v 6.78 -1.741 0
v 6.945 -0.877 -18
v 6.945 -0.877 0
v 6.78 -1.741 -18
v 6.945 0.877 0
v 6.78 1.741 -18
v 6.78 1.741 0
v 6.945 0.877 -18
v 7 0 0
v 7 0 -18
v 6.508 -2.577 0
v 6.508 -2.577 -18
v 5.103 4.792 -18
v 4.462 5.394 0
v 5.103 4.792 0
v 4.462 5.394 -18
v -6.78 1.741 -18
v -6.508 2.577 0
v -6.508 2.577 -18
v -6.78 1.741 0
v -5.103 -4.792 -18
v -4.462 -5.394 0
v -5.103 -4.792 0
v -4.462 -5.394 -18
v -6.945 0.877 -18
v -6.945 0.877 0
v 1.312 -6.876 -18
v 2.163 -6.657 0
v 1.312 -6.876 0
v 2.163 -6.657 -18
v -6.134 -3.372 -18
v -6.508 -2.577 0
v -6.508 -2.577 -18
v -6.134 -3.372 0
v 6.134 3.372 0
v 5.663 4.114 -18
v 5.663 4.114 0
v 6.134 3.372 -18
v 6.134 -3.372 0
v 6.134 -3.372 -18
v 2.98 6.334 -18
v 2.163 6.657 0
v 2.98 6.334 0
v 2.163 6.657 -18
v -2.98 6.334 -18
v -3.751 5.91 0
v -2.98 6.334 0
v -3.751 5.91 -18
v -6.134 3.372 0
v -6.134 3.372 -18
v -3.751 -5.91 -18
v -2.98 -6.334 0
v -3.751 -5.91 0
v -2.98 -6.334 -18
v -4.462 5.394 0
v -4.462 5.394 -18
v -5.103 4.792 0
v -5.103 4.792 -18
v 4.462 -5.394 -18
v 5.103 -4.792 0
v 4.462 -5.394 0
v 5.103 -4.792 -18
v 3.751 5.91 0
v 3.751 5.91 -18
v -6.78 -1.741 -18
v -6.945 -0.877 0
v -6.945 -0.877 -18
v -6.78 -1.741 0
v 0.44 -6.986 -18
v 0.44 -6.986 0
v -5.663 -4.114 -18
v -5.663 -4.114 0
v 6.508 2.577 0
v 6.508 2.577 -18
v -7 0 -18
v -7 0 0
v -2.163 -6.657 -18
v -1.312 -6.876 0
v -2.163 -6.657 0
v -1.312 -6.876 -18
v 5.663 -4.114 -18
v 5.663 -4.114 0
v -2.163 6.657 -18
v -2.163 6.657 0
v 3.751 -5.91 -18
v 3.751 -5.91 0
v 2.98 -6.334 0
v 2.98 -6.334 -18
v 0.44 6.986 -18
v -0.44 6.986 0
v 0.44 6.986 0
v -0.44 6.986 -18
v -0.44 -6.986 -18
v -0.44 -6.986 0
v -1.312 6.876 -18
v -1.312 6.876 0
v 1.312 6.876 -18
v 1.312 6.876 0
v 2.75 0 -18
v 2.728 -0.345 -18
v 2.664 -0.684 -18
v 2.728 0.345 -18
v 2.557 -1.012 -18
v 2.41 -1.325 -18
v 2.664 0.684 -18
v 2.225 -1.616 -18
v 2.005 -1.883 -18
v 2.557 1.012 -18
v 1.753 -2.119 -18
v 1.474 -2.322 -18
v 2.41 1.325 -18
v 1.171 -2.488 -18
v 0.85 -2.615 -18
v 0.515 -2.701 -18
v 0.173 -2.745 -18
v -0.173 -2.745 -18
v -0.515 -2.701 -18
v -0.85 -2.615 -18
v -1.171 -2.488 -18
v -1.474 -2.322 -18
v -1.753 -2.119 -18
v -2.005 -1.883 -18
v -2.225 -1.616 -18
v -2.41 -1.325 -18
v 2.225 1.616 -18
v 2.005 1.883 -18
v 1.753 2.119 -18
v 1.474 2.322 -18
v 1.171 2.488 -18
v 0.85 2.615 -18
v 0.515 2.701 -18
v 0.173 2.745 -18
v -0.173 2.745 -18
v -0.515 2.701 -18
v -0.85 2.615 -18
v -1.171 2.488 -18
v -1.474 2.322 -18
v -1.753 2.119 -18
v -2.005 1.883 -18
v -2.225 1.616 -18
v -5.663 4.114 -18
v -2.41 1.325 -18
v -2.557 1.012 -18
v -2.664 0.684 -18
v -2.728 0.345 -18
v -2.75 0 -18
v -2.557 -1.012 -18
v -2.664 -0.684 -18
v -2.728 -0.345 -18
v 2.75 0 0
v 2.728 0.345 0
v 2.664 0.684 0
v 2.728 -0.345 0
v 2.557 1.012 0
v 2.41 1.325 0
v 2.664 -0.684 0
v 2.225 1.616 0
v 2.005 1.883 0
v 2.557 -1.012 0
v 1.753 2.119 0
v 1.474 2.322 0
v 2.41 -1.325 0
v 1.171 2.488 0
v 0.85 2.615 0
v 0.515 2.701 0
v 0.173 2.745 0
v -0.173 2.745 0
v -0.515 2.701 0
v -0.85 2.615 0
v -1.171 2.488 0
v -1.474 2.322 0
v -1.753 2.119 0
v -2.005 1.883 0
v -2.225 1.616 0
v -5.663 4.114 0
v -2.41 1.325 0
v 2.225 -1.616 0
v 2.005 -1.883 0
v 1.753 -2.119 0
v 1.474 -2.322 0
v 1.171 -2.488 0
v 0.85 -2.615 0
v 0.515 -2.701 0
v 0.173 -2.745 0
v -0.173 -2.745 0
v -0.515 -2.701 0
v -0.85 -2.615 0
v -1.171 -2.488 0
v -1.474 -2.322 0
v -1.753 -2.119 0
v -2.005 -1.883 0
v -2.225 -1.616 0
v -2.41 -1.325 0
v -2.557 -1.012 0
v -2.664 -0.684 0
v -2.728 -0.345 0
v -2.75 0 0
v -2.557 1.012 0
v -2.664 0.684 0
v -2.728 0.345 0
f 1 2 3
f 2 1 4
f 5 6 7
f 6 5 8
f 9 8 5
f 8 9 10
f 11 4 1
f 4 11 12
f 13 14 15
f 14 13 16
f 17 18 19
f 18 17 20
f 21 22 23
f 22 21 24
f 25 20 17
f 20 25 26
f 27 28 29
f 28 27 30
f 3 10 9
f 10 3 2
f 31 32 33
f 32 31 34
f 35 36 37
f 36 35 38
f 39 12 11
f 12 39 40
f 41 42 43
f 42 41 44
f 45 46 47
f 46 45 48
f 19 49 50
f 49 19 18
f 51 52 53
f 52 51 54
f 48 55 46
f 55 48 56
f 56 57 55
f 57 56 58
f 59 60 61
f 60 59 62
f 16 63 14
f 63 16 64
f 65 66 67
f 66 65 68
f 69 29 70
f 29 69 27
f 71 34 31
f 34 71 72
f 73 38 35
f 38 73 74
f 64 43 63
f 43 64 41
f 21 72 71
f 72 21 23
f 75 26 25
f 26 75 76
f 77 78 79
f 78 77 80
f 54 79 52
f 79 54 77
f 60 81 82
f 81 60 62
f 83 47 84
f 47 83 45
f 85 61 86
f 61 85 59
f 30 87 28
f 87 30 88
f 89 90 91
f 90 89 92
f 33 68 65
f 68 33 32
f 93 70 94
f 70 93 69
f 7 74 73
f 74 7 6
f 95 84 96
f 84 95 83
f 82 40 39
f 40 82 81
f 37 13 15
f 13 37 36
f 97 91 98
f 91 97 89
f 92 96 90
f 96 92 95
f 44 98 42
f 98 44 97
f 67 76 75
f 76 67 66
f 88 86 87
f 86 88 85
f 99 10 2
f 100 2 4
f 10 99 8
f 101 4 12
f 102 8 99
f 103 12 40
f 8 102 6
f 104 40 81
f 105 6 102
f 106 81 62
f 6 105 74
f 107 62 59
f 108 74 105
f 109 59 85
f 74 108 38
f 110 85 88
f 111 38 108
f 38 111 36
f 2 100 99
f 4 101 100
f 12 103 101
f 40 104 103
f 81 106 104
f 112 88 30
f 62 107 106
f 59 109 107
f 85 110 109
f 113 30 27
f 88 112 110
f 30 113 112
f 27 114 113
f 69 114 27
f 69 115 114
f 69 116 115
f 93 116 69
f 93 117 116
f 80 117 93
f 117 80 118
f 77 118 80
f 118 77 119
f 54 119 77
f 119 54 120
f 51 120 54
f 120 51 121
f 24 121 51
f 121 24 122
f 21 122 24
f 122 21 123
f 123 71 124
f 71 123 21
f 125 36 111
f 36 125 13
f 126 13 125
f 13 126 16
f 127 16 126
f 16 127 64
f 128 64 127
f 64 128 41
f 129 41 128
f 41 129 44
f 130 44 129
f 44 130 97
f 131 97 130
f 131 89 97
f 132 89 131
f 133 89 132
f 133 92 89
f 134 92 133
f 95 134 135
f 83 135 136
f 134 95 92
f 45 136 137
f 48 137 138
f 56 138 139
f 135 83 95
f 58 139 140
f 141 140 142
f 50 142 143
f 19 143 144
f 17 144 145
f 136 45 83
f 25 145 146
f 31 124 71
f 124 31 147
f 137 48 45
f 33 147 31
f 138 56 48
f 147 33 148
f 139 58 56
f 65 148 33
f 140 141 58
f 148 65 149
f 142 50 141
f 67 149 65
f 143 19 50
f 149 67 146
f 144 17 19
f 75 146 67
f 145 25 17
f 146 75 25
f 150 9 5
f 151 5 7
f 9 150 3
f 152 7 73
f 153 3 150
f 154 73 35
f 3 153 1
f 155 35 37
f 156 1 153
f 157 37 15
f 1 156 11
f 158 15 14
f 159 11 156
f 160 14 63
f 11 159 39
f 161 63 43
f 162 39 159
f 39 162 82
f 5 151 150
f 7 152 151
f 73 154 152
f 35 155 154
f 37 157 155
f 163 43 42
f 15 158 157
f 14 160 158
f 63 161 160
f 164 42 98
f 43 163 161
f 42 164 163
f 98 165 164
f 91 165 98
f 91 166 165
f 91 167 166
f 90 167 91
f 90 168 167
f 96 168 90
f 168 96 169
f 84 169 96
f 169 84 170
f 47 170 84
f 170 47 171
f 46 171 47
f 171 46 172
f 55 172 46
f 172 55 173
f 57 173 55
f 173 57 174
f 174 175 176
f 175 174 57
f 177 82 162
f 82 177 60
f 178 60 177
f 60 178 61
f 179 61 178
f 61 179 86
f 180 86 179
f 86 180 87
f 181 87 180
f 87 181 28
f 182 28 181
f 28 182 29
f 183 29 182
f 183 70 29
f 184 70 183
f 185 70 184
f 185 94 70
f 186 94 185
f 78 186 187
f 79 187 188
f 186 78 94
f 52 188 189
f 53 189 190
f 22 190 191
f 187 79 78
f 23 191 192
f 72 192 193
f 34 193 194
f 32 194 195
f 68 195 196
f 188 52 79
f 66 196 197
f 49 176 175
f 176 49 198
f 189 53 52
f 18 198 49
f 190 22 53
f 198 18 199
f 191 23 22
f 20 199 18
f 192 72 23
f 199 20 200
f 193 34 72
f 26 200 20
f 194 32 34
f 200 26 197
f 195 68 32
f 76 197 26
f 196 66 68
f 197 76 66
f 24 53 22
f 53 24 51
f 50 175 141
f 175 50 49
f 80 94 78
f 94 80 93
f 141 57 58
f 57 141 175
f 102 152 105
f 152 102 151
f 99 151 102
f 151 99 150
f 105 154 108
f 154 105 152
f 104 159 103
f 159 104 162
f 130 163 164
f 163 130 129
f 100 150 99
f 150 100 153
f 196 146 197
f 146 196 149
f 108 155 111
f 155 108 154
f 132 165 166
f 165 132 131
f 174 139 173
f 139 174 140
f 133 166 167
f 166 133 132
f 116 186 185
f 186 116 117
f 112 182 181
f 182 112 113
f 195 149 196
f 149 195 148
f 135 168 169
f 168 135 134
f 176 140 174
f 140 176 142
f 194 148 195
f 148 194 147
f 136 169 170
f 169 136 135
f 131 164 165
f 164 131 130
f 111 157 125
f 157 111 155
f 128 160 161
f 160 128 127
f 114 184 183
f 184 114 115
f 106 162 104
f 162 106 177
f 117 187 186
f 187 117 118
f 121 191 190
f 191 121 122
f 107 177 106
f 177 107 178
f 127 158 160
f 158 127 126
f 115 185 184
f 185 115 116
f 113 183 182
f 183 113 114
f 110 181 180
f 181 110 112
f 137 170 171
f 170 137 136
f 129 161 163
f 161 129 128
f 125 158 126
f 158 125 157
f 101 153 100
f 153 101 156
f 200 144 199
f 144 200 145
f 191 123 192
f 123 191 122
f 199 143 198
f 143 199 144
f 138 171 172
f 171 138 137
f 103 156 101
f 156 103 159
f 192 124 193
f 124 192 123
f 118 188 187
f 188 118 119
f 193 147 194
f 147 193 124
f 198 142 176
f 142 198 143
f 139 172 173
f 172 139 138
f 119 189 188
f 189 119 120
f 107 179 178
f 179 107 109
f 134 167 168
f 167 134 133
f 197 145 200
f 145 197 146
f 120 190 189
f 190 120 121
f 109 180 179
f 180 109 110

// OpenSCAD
$fn = 50;


difference() {
	union() {
		translate(v = [0, 0, -18.0000000000]) {
			cylinder(h = 18, r = 7.0000000000);
		}
	}
	union() {
		#translate(v = [0, 0, -18]) {
			cylinder(h = 18, r = 2.7500000000);
		}
	}
}
